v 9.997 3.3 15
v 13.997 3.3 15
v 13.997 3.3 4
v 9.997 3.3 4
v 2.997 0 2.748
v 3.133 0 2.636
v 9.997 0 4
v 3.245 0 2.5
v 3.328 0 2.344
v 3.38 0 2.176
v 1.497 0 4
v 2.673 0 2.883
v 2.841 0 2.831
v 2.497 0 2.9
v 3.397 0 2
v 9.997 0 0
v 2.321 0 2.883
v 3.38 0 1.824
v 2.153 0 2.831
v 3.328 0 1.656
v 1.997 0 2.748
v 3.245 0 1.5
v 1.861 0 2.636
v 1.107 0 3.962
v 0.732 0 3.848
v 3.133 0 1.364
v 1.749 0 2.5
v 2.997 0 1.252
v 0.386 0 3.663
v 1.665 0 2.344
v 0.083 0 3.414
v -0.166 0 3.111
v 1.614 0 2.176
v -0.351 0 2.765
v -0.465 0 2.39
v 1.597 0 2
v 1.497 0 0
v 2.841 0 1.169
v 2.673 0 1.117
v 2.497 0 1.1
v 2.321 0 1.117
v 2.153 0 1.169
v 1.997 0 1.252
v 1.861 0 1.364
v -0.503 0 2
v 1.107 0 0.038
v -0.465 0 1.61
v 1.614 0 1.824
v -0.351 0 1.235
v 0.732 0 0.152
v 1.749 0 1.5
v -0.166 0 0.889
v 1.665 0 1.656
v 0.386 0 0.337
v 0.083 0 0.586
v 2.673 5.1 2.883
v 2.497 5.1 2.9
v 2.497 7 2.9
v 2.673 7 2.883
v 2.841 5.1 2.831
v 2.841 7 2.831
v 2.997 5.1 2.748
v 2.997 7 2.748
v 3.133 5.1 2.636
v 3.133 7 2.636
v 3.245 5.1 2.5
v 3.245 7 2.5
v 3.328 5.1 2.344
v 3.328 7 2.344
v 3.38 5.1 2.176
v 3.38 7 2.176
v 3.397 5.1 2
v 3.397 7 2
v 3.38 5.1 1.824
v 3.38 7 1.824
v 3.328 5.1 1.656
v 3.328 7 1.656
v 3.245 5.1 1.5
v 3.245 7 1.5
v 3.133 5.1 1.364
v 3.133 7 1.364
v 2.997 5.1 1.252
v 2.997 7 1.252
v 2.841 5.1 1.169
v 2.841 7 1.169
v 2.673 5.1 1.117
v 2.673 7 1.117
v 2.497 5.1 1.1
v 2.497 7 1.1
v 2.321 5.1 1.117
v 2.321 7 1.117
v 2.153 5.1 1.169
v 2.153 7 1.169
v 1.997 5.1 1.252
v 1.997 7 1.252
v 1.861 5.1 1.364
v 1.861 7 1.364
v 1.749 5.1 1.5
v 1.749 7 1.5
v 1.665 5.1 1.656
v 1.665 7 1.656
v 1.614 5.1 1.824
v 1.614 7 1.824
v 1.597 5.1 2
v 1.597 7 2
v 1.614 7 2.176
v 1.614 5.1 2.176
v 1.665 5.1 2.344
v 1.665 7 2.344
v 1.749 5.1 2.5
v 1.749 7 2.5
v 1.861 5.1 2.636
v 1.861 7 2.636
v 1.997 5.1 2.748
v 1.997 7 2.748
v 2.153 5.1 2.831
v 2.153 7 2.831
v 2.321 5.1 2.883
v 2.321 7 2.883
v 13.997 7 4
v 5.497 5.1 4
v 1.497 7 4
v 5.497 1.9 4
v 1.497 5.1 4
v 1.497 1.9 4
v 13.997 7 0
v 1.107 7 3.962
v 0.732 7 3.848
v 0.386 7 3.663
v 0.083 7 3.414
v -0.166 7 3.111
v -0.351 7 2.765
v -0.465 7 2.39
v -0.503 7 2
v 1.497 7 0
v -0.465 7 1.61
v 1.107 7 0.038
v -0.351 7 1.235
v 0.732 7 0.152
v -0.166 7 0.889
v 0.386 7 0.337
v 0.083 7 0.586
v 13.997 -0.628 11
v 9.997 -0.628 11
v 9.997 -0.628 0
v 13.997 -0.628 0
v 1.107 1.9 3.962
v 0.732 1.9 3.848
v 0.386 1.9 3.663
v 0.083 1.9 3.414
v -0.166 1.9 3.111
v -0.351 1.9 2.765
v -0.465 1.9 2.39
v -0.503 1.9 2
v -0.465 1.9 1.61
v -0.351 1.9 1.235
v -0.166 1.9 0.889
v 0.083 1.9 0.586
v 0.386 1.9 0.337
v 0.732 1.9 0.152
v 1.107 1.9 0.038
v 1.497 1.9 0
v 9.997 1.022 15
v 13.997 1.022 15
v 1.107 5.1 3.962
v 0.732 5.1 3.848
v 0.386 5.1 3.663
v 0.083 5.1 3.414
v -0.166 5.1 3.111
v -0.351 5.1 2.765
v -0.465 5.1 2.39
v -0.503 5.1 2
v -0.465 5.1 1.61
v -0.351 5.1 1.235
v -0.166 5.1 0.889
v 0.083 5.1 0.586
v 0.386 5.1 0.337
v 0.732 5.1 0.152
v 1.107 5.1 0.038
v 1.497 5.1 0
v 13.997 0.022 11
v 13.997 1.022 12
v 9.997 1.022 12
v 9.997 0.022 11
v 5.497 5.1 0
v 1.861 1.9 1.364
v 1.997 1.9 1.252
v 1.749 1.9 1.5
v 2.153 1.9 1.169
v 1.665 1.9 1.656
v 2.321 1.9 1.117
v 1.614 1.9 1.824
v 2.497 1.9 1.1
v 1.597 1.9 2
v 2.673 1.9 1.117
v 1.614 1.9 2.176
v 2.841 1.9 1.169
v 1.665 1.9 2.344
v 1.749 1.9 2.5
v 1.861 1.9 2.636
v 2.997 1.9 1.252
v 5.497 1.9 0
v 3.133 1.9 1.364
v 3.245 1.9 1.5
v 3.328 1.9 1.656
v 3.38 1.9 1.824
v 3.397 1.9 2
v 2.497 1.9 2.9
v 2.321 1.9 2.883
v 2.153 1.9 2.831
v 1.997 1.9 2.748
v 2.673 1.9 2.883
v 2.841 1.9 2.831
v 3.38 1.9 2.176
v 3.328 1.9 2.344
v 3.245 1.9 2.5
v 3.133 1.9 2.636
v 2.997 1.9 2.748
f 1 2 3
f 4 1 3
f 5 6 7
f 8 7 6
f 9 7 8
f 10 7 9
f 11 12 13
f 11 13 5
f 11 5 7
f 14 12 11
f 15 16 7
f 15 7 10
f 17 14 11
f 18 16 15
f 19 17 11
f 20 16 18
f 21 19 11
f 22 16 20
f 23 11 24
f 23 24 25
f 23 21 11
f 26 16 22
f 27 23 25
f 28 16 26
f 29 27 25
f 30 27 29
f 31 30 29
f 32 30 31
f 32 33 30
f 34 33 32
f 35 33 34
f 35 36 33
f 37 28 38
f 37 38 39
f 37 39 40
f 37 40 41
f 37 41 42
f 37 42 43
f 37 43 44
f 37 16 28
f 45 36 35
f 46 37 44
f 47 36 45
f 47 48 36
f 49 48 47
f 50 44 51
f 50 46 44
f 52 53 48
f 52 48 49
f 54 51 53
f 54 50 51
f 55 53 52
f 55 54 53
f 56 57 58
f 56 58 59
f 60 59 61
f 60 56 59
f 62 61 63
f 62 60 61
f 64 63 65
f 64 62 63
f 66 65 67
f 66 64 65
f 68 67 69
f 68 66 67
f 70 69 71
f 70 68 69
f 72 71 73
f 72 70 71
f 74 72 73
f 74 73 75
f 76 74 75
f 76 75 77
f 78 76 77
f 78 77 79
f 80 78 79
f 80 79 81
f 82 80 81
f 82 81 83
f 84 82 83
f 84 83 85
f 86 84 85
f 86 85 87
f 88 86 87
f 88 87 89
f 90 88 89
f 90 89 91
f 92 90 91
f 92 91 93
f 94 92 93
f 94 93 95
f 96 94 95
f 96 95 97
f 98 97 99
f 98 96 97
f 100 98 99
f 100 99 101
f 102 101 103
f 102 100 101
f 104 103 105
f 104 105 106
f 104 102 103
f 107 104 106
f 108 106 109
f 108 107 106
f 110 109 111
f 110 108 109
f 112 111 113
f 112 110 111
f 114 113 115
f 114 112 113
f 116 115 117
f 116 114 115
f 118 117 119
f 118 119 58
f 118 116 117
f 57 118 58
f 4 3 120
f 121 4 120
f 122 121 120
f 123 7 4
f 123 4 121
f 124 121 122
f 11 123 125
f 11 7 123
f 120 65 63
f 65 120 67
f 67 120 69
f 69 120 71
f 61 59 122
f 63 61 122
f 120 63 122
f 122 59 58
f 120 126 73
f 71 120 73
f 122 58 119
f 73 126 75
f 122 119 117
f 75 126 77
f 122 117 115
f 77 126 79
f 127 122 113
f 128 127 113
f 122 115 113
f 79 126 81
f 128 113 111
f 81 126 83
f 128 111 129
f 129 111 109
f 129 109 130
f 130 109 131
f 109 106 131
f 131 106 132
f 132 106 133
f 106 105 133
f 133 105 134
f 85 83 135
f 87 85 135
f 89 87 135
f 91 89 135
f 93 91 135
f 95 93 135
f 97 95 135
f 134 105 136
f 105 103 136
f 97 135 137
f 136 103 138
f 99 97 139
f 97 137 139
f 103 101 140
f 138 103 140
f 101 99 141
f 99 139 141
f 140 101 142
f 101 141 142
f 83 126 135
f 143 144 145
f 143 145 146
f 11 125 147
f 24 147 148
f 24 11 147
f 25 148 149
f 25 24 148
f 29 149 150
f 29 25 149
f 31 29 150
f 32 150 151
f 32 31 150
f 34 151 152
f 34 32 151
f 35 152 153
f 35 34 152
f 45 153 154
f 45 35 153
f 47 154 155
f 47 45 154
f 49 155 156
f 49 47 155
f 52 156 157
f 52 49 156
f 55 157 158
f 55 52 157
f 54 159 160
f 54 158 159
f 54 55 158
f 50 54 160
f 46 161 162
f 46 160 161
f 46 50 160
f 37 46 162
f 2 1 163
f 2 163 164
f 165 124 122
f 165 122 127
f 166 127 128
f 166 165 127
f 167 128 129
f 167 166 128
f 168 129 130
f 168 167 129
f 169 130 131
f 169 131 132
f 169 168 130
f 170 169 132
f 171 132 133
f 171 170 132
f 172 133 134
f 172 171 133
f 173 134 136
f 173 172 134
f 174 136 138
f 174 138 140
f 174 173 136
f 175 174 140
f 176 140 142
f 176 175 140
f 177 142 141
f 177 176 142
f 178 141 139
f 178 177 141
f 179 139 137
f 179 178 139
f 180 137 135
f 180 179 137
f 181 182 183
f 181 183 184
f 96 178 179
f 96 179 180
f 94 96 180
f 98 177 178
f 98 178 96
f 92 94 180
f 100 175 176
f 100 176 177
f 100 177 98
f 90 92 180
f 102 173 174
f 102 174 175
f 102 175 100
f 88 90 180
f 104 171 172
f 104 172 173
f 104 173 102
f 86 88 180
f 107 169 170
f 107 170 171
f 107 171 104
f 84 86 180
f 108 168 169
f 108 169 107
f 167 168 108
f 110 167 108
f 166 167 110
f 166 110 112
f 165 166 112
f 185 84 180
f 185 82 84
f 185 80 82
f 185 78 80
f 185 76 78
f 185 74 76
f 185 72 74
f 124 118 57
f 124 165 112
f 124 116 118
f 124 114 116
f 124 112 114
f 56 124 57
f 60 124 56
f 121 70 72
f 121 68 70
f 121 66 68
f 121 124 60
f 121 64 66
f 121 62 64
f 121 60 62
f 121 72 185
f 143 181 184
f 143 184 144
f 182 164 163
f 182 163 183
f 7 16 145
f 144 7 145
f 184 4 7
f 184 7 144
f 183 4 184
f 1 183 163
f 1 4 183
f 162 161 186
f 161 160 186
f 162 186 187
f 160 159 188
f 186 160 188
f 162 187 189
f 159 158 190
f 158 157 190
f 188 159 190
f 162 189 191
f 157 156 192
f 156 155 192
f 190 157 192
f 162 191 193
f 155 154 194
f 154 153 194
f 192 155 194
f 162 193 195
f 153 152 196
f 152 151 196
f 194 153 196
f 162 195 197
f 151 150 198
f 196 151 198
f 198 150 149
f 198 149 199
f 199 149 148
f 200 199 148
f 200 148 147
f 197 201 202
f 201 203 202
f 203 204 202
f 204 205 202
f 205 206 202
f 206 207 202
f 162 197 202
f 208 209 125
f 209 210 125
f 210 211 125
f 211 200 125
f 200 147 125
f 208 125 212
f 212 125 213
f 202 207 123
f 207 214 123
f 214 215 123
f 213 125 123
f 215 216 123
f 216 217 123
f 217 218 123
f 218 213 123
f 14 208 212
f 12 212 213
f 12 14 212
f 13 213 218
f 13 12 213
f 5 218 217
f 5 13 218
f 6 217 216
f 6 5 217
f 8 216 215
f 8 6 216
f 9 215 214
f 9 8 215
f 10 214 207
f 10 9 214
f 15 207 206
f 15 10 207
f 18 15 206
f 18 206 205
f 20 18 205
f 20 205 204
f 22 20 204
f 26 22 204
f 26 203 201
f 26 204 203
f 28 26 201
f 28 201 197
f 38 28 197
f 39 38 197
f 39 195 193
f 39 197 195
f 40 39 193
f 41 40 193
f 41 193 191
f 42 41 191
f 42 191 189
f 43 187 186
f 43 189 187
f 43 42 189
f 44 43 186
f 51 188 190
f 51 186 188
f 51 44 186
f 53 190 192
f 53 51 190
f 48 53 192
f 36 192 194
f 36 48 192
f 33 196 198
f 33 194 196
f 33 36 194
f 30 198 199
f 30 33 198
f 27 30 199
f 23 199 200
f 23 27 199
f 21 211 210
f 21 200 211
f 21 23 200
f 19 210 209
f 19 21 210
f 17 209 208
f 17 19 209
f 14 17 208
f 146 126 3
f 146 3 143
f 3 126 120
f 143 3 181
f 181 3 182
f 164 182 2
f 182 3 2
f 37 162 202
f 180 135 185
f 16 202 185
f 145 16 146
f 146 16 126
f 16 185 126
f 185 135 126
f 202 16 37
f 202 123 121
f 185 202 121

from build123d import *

# Parameters (mm, degrees)
SKETCH1_R           = 0.9
BOSS_EXTRUDE1_DEPTH = 7
CUT_EXTRUDE1_REACH  = 21.129
SKETCH2_W           = 6
SKETCH2_H           = 3.2
SKETCH3_W           = 11
SKETCH3_H           = 3.7
CUT_EXTRUDE2_DEPTH  = 4
SKETCH6_W           = 4
SKETCH6_H           = 15
BOSS_EXTRUDE2_DEPTH = 0.6275
CUT_EXTRUDE3_REACH  = 24.006


with BuildPart() as part:
    # Sketch1 → Boss-Extrude1 (new body)
    with BuildSketch(Plane(origin=(0, 0, 0), x_dir=(1, 0, 0), z_dir=(0, 1, 0))):
        with BuildLine():
            Line((1.496941475, 0), (13.996941475, 0))
            Line((13.996941475, 0), (13.996941475, -15))
            Line((13.996941475, -15), (9.996941475, -15))
            Line((9.996941475, -15), (9.996941475, -4))
            Line((9.996941475, -4), (1.496941475, -4))
            ThreePointArc((1.496941475, -4), (-0.503058525, -2), (1.496941475, 0))
        make_face()
        with Locations(Location((2.496941475, -2, 0), (0, 0, 270))):
            Circle(SKETCH1_R, mode=Mode.SUBTRACT)
    extrude(amount=BOSS_EXTRUDE1_DEPTH)

    # Sketch2 → Cut-Extrude1 (cut, up to next)
    with BuildSketch(Plane.XY.offset(4), mode=Mode.PRIVATE) as cut_extrude1_sk1:
        with Locations((2.496941475, 3.5)):
            Rectangle(SKETCH2_W, SKETCH2_H)
    cut_extrude1_tool1 = extrude(cut_extrude1_sk1.sketch, amount=-CUT_EXTRUDE1_REACH, mode=Mode.PRIVATE) & part.part
    add(cut_extrude1_tool1.solids().sort_by_distance((2.496941, 3.5, 4))[0], mode=Mode.SUBTRACT)

    # Sketch3 → Cut-Extrude2 (cut)
    with BuildSketch(Plane(origin=(13.996941475, 0, 0), x_dir=(0, 0, -1), z_dir=(1, 0, 0))):
        with Locations((-9.5, 5.15)):
            Rectangle(SKETCH3_W, SKETCH3_H)
    extrude(amount=-CUT_EXTRUDE2_DEPTH, mode=Mode.SUBTRACT)

    # Sketch6 → Boss-Extrude2 (add)
    with BuildSketch(Plane.XZ):
        with Locations((11.996941475, 7.5)):
            Rectangle(SKETCH6_W, SKETCH6_H)
    extrude(amount=BOSS_EXTRUDE2_DEPTH)

    # Sketch4 → Cut-Extrude3 (cut, up to next)
    with BuildSketch(Plane(origin=(13.996941475, 0, 0), x_dir=(0, 0, -1), z_dir=(1, 0, 0)), mode=Mode.PRIVATE) as cut_extrude3_sk1:
        Polygon((-11, -0.6275), (-15, -0.6275), (-15, 1.0225), (-12, 1.0225), (-11, 0.0225), align=None)
    cut_extrude3_tool1 = extrude(cut_extrude3_sk1.sketch, amount=-CUT_EXTRUDE3_REACH, mode=Mode.PRIVATE) & part.part
    add(cut_extrude3_tool1.solids().sort_by_distance((13.996941, 0.157199, 13.136612))[0], mode=Mode.SUBTRACT)


solid = part.part
